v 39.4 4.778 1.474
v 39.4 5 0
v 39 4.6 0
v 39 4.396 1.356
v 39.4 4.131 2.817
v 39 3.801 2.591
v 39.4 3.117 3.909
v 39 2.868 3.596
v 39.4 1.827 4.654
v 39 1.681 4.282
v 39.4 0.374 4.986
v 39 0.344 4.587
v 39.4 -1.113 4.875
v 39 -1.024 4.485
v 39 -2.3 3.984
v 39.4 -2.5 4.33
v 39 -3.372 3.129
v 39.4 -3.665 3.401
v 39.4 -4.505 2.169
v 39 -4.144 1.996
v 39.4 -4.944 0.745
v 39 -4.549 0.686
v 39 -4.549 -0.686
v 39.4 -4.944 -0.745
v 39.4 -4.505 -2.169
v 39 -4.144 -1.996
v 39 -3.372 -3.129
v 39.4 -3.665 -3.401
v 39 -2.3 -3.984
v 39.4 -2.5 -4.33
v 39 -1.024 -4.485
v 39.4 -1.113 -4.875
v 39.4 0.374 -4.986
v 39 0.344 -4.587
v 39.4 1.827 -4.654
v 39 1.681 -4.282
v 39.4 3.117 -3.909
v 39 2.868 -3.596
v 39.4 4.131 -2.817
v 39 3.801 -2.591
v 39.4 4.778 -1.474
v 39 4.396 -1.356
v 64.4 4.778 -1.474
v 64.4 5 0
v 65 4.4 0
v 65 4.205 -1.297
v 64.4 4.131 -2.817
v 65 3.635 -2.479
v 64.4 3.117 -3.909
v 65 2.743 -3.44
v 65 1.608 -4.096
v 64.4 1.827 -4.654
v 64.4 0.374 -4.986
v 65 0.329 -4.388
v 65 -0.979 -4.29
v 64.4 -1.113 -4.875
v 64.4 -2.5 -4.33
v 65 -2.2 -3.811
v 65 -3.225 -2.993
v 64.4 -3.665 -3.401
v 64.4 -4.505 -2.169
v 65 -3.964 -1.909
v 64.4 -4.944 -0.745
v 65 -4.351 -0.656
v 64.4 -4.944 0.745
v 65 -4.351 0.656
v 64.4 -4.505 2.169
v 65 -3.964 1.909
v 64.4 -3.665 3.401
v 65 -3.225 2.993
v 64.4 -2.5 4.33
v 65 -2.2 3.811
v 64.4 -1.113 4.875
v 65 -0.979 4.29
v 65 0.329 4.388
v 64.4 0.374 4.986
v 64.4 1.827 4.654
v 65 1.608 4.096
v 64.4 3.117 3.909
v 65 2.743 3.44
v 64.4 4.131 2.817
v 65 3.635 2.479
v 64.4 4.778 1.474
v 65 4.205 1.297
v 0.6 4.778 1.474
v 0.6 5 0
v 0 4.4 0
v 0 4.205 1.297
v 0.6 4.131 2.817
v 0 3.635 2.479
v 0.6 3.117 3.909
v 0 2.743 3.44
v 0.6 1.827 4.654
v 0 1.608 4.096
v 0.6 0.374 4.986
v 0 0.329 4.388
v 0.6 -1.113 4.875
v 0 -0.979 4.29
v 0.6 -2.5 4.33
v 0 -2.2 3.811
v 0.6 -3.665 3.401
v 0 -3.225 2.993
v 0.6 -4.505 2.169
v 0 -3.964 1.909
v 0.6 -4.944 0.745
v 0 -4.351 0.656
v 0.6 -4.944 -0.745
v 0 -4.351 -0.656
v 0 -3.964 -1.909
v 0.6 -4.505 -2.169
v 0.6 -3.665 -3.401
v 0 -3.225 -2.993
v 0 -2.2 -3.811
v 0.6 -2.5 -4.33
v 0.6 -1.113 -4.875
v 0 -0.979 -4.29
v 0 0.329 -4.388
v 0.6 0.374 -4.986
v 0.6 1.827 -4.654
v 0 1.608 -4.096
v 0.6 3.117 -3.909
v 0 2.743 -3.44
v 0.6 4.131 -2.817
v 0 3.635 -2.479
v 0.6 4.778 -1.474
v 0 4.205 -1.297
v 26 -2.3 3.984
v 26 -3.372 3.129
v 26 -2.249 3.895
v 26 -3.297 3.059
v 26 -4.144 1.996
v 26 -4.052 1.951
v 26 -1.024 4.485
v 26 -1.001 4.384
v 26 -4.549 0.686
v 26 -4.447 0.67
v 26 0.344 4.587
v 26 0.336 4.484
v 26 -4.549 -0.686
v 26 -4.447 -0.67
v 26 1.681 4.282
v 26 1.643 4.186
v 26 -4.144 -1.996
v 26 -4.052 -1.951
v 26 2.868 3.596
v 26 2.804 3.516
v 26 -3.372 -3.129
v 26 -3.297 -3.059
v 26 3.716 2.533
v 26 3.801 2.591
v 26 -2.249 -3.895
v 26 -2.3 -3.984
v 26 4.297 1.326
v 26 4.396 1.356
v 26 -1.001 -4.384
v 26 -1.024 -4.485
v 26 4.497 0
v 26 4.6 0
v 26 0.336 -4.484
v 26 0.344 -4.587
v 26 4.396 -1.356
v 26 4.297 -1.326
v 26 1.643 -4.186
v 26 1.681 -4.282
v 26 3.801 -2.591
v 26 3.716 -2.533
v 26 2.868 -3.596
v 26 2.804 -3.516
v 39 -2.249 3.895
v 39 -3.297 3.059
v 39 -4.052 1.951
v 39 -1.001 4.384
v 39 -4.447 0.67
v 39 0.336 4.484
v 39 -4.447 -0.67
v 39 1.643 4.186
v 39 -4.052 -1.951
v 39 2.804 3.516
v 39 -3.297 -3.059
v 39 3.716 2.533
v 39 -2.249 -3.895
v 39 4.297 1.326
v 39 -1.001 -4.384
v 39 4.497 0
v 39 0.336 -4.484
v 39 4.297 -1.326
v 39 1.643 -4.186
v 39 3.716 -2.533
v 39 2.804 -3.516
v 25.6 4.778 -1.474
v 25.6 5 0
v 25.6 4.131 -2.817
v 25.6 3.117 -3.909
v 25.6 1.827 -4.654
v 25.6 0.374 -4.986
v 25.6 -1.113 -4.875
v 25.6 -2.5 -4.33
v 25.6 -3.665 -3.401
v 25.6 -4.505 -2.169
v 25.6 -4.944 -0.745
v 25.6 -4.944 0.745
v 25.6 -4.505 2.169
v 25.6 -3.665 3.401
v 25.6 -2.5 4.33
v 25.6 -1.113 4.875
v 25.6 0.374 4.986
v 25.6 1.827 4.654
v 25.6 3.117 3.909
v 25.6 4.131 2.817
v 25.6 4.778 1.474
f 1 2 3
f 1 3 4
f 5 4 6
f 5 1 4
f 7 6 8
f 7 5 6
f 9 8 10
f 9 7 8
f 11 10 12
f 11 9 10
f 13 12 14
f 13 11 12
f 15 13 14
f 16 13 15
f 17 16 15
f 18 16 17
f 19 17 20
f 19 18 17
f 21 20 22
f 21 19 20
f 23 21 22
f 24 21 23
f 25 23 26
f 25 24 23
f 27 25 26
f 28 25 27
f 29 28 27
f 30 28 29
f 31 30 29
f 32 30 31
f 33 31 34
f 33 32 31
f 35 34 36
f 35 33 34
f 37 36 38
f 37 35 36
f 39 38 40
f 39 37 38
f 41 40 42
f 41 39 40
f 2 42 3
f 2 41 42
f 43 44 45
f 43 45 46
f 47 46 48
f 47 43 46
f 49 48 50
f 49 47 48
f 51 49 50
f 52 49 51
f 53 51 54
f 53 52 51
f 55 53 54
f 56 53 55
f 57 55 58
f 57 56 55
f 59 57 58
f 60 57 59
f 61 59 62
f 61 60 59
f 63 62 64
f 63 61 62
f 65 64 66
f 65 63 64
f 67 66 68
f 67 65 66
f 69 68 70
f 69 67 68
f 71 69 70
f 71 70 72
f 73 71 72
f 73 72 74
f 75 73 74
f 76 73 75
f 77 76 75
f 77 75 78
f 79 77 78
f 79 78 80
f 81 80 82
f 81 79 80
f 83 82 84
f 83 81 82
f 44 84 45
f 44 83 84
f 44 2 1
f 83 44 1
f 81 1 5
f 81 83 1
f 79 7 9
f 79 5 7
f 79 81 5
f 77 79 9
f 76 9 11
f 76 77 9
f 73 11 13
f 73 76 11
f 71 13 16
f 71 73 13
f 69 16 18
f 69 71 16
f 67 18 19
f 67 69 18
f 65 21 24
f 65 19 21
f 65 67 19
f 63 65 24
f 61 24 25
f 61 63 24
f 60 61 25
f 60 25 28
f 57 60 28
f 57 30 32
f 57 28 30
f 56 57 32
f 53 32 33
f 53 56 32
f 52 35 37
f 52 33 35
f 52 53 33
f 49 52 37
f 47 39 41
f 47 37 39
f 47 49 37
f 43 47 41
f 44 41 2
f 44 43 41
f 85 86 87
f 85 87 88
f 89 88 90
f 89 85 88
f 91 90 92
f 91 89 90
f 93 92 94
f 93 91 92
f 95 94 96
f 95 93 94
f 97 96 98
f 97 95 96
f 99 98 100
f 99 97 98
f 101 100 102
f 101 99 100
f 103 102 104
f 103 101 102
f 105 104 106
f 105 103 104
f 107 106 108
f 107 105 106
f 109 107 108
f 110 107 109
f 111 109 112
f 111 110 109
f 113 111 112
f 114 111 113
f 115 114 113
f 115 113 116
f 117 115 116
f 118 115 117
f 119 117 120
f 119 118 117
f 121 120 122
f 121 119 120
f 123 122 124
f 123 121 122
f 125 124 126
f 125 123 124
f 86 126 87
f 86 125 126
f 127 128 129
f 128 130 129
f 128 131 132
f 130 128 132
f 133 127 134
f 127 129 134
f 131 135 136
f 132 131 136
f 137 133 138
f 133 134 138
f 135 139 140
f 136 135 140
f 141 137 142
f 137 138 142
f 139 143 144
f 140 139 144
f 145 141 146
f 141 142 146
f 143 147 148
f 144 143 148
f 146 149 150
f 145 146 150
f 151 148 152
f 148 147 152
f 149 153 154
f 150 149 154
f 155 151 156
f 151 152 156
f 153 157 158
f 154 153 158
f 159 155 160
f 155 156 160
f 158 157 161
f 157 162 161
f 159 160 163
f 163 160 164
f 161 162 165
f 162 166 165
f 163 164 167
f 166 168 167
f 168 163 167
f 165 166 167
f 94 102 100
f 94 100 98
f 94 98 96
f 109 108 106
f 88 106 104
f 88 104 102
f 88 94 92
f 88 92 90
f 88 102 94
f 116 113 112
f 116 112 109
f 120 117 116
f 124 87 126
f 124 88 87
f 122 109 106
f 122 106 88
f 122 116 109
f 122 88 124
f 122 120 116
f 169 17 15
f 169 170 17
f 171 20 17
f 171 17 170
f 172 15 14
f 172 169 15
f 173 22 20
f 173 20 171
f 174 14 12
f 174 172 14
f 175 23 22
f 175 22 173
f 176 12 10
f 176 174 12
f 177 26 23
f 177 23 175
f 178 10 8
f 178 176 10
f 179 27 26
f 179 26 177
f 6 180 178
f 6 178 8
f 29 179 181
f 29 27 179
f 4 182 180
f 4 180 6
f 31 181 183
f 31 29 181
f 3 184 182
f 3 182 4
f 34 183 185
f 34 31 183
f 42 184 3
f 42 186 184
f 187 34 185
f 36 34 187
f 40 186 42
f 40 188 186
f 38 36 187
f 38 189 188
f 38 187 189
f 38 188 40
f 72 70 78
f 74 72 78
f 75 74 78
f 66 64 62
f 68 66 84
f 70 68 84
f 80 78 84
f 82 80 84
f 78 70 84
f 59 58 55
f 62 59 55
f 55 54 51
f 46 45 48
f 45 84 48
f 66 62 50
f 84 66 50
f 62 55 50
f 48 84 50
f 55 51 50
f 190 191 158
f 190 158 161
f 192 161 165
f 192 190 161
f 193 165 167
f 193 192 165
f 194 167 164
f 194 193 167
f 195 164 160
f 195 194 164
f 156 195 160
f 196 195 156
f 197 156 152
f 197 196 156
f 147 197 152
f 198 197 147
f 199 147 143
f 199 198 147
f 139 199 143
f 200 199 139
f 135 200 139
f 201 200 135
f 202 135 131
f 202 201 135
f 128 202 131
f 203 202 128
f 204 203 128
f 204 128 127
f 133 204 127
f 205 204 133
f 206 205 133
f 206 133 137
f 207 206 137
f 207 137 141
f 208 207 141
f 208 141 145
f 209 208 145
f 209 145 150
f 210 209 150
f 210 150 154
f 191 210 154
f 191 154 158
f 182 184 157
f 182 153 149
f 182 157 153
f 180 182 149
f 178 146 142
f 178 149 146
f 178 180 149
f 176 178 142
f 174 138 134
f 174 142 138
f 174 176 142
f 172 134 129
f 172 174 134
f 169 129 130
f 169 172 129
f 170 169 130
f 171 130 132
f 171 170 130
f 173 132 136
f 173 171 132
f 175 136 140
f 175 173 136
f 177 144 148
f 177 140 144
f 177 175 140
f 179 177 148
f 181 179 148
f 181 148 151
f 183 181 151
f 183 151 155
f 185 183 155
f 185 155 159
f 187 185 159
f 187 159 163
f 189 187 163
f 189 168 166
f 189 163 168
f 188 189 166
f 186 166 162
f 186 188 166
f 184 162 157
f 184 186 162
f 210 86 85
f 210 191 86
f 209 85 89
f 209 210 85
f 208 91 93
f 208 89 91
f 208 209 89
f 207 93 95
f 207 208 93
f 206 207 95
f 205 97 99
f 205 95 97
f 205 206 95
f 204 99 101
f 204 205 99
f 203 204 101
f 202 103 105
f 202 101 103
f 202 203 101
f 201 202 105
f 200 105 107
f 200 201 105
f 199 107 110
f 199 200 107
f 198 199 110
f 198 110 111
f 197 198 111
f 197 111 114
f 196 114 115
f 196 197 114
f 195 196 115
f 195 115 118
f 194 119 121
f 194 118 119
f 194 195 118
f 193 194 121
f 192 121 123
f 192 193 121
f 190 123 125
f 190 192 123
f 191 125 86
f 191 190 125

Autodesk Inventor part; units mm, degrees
ref_plane "YZ Plane" through (0, 0, 0) normal (1, 0, 0) x (0, 1, 0)
ref_plane "XZ Plane" through (0, 0, 0) normal (0, 1, 0) x (-1, 0, 0)
sketch "Sketch1" plane through (0, 0, 0) normal (0, 0, 1) x (1, 0, 0)
  line L0 (0, 0) -> (0, 5)
  line L1 (0, 5) -> (26, 5)
  line L2 (26, 5) -> (26, 4.497)
  line L3 (26, 4.497) -> (39, 4.497)
  line L4 (39, 4.497) -> (39, 5)
  line L5 (39, 5) -> (65, 5)
  line L6 (65, 5) -> (65, 0)
  line L7 (65, 0) -> (0, 0)
  dimension "d1" = 10
  dimension "d3" = 8.994
  dimension "d4" = 26
  dimension "d6" = 26
  dimension "d43" = 65
revolve "Вращение1" add sketch "Sketch1" angle 360 about axis through (65, 0, 0) along (-1, 0, 0)
thread "Резьба1" size "M10x1.5" class "6g" standard "ISO Metric profile" length 26
thread "Резьба2" size "M10x1.5" class "6g" standard "ISO Metric profile" length 26
chamfer "Фаска1" distance 0.6 angle 45 2 edges at (0, -5, 0) (65, -5, 0)
chamfer "Фаска2" distance 0.4 angle 45 2 edges at (26, -5, 0) (39, -5, 0)
ref_plane "Work Plane1" through (26, 0, 0) normal (1, 0, 0) x (0, 1, 0)
sketch "Sketch2" plane through (26, 0, 0) normal (1, 0, 0) x (0, 1, 0)
  circle A0 centre (0, 0) radius 5
  point P0 (0, 0)
  dimension "d35" = 10
boundary_patch "Участок поверхности1"
equation "\"d8\" = b"
equation "\"d29\" = b"
equation "\"d31\" = C_"
equation "\"d37\" = C2_"
equation "\"d1\" = d"
equation "\"d3\" = d2"
equation "\"d4\" = b"
equation "\"d6\" = b"
equation "\"d43\" = L"
equation "\"d35\" = d"
equation "\"C_\" = 0.6"
equation "\"d\" = 10"
equation "\"d2\" = 8.994"
equation "\"L\" = 65"
equation "\"b\" = 26"
equation "\"d34\" = -b"
equation "\"C2_\" = 0.4"
equation "\"Grip_Length\" = 13"
properties part number "Шпилька 2 M10-6g×65 ГОСТ 22042-76" material "Сталь, мягкая"
